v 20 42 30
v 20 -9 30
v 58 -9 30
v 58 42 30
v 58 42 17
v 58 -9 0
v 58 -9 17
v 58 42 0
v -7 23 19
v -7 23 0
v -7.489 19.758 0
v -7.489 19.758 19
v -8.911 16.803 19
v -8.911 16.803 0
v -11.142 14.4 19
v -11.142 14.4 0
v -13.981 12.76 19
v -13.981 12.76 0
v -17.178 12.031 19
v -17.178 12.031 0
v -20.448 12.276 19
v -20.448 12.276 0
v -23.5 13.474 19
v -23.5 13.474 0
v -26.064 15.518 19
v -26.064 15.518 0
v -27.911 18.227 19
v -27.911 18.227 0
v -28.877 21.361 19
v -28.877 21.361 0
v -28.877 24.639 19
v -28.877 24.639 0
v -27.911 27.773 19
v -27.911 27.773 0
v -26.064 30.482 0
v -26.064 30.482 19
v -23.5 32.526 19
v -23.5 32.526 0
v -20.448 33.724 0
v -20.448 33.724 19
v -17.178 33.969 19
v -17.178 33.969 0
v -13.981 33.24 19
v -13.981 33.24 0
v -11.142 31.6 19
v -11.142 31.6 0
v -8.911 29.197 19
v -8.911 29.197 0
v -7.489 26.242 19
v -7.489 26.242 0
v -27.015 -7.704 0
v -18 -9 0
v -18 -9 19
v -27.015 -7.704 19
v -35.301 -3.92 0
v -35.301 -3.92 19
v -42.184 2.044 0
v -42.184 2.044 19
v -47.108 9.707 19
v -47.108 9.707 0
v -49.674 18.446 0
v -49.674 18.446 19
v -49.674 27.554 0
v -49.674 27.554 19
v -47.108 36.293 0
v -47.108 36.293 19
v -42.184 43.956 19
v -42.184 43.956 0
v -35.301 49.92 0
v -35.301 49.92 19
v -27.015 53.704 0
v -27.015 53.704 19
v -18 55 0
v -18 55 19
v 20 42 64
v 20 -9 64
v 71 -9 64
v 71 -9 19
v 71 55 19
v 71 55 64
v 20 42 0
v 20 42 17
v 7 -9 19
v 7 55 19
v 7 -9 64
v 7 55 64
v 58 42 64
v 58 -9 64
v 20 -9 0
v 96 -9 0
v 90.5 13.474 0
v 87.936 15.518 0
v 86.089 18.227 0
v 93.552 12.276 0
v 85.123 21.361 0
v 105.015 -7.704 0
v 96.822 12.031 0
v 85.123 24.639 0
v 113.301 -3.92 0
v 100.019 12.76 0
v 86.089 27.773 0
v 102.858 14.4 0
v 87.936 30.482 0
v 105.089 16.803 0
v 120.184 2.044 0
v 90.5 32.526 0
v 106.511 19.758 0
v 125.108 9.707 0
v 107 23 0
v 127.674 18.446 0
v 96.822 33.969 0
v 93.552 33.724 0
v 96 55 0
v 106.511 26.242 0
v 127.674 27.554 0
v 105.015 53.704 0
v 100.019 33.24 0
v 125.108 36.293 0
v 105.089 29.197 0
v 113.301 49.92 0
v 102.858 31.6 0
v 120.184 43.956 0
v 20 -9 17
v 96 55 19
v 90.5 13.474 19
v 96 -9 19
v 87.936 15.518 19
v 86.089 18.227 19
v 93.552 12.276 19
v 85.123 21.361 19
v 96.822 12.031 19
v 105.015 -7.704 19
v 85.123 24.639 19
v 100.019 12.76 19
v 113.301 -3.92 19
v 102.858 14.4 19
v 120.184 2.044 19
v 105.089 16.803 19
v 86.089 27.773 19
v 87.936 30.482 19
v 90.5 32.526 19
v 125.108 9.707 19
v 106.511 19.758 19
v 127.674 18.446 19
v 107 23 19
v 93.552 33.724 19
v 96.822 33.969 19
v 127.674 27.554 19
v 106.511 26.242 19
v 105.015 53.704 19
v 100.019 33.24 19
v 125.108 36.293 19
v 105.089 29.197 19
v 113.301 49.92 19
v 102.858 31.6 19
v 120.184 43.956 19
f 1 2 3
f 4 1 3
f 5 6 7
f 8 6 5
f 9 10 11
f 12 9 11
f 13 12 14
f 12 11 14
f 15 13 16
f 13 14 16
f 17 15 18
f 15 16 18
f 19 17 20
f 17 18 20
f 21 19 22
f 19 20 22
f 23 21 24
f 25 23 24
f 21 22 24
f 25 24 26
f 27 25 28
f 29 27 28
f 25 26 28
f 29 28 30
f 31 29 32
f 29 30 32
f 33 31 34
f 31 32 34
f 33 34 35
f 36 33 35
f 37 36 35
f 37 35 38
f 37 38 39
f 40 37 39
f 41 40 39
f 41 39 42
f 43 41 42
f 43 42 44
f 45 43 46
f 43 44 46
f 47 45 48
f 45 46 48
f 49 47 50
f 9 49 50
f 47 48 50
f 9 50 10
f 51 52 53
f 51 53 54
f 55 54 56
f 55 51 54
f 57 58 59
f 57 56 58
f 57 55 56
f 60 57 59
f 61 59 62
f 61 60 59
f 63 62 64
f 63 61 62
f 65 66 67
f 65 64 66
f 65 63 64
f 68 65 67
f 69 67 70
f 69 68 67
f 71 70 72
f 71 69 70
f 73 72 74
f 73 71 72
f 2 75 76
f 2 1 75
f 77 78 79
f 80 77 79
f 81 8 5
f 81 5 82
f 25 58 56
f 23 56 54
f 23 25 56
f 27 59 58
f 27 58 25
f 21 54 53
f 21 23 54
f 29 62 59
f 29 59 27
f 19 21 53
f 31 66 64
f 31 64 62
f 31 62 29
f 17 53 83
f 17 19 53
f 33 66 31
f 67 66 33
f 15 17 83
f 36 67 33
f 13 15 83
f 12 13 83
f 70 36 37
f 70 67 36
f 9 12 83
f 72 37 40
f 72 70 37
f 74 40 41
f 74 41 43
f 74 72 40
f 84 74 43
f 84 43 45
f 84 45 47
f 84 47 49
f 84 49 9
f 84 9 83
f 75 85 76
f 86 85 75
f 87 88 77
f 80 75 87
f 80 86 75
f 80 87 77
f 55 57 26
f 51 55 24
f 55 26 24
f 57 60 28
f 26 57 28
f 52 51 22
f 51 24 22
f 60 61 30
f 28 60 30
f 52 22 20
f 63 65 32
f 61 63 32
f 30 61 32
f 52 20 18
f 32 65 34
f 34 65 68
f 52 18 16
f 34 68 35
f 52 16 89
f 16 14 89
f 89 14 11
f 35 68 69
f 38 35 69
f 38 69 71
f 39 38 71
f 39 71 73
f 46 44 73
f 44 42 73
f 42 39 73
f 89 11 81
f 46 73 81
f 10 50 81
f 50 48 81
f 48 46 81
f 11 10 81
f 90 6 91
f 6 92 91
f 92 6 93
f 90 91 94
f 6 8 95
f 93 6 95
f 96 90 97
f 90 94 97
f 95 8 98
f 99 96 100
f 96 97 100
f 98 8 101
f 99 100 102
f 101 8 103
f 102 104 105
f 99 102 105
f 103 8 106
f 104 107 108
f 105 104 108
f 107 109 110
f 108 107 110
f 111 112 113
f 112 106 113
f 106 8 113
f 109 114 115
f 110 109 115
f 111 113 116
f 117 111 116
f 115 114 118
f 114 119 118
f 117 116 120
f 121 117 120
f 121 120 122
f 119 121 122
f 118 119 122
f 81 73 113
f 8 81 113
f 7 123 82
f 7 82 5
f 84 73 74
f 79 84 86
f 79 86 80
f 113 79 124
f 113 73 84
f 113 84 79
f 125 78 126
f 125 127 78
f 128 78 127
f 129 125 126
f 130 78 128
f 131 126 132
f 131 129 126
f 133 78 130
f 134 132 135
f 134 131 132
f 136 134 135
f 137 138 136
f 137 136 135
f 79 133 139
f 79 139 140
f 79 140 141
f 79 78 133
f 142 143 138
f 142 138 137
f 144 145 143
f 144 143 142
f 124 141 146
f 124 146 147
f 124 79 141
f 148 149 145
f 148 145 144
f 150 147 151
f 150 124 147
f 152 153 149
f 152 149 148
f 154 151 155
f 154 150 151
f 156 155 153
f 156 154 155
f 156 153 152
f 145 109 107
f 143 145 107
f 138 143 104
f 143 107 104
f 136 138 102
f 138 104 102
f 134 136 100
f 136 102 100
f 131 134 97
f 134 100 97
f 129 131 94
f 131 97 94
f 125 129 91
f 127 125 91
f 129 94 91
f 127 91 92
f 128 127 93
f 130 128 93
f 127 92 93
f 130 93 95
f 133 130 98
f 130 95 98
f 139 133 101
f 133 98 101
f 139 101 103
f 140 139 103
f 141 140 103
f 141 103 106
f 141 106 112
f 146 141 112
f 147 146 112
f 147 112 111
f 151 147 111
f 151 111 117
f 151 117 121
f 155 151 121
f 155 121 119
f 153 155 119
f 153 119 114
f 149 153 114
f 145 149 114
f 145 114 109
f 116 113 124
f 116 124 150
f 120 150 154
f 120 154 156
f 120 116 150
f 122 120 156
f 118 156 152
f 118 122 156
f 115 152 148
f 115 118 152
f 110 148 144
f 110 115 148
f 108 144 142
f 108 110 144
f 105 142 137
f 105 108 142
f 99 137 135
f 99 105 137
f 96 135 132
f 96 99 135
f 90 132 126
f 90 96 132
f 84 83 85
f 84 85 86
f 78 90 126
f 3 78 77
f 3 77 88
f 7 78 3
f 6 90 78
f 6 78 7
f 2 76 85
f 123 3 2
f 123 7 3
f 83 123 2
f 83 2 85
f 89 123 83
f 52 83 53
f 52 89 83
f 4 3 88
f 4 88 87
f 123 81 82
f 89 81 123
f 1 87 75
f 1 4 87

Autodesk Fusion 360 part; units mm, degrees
sketch "Sketch2" plane through (0, 0, 0) normal (0, 0, 1) x (1, 0, 0)
  line L0 (-18, 55) -> (7, 55)
  line L1 (7, 55) -> (71, 55)
  line L2 (71, 55) -> (96, 55)
  line L3 (96, -9) -> (96, 23)
  line L4 (96, 23) -> (96, 55)
  line L5 (96, -9) -> (71, -9)
  line L6 (71, -9) -> (58, -9)
  line L7 (58, -9) -> (20, -9)
  line L8 (20, -9) -> (7, -9)
  line L9 (7, -9) -> (-18, -9)
  line L10 (71, -9) -> (71, 55)
  line L11 (58, -9) -> (58, 42)
  line L12 (58, 42) -> (20, 42)
  line L13 (20, 42) -> (20, -9)
  line L14 (7, -9) -> (7, 55)
  line L15 (-18, -9) -> (-18, 55)
  circle A0 centre (96, 23) radius 32
  circle A1 centre (-18, 23) radius 32
  circle A2 centre (-18, 23) radius 11
  circle A3 centre (96, 23) radius 11
  dimension "d7" = 25
  dimension "d8" = 64
  dimension "d9" = 25
  dimension "d13" = 32
  dimension "d14" = 25
  dimension "d15" = 13
  dimension "d16" = 38
  dimension "d17" = 13
  dimension "d18" = 25
  dimension "d20" = 51
  dimension "d21" = 38
  dimension "d23" = 22
  dimension "d24" = 22
extrude "Extrude1" add sketch "Sketch2" along normal blind 19 contours L14 L15 A1 A2 | L15 A1 A2 | L0 L14 A1 | L9 L14 A1 | L2 L10 A0 | L3 L4 A0 A3 | L3 L4 L10 A0 A3 | L5 L10 A0 makes body 1 at (85.8333, -1.5088, 19) makes body 2 at (-7.8333, -1.5088, 0)
extrude "Extrude2" add sketch "Sketch2" along normal blind 64 contours L1 L6 L8 L10 L11 L12 L13 L14 A0 A1 | L14 A1 | L10 A0 bodies 1 2
ref_plane "WorkPlane1" through (39, -9, 0) normal (0, -0.7071, 0.7071) x (-1, 0, 0)
extrude "Extrude3" add sketch "Sketch2" along normal blind 13 contours L7 L11 L12 L13 start surface through (39, -9, 0) normal (0, -0.707107, 0.707107) bodies 1
